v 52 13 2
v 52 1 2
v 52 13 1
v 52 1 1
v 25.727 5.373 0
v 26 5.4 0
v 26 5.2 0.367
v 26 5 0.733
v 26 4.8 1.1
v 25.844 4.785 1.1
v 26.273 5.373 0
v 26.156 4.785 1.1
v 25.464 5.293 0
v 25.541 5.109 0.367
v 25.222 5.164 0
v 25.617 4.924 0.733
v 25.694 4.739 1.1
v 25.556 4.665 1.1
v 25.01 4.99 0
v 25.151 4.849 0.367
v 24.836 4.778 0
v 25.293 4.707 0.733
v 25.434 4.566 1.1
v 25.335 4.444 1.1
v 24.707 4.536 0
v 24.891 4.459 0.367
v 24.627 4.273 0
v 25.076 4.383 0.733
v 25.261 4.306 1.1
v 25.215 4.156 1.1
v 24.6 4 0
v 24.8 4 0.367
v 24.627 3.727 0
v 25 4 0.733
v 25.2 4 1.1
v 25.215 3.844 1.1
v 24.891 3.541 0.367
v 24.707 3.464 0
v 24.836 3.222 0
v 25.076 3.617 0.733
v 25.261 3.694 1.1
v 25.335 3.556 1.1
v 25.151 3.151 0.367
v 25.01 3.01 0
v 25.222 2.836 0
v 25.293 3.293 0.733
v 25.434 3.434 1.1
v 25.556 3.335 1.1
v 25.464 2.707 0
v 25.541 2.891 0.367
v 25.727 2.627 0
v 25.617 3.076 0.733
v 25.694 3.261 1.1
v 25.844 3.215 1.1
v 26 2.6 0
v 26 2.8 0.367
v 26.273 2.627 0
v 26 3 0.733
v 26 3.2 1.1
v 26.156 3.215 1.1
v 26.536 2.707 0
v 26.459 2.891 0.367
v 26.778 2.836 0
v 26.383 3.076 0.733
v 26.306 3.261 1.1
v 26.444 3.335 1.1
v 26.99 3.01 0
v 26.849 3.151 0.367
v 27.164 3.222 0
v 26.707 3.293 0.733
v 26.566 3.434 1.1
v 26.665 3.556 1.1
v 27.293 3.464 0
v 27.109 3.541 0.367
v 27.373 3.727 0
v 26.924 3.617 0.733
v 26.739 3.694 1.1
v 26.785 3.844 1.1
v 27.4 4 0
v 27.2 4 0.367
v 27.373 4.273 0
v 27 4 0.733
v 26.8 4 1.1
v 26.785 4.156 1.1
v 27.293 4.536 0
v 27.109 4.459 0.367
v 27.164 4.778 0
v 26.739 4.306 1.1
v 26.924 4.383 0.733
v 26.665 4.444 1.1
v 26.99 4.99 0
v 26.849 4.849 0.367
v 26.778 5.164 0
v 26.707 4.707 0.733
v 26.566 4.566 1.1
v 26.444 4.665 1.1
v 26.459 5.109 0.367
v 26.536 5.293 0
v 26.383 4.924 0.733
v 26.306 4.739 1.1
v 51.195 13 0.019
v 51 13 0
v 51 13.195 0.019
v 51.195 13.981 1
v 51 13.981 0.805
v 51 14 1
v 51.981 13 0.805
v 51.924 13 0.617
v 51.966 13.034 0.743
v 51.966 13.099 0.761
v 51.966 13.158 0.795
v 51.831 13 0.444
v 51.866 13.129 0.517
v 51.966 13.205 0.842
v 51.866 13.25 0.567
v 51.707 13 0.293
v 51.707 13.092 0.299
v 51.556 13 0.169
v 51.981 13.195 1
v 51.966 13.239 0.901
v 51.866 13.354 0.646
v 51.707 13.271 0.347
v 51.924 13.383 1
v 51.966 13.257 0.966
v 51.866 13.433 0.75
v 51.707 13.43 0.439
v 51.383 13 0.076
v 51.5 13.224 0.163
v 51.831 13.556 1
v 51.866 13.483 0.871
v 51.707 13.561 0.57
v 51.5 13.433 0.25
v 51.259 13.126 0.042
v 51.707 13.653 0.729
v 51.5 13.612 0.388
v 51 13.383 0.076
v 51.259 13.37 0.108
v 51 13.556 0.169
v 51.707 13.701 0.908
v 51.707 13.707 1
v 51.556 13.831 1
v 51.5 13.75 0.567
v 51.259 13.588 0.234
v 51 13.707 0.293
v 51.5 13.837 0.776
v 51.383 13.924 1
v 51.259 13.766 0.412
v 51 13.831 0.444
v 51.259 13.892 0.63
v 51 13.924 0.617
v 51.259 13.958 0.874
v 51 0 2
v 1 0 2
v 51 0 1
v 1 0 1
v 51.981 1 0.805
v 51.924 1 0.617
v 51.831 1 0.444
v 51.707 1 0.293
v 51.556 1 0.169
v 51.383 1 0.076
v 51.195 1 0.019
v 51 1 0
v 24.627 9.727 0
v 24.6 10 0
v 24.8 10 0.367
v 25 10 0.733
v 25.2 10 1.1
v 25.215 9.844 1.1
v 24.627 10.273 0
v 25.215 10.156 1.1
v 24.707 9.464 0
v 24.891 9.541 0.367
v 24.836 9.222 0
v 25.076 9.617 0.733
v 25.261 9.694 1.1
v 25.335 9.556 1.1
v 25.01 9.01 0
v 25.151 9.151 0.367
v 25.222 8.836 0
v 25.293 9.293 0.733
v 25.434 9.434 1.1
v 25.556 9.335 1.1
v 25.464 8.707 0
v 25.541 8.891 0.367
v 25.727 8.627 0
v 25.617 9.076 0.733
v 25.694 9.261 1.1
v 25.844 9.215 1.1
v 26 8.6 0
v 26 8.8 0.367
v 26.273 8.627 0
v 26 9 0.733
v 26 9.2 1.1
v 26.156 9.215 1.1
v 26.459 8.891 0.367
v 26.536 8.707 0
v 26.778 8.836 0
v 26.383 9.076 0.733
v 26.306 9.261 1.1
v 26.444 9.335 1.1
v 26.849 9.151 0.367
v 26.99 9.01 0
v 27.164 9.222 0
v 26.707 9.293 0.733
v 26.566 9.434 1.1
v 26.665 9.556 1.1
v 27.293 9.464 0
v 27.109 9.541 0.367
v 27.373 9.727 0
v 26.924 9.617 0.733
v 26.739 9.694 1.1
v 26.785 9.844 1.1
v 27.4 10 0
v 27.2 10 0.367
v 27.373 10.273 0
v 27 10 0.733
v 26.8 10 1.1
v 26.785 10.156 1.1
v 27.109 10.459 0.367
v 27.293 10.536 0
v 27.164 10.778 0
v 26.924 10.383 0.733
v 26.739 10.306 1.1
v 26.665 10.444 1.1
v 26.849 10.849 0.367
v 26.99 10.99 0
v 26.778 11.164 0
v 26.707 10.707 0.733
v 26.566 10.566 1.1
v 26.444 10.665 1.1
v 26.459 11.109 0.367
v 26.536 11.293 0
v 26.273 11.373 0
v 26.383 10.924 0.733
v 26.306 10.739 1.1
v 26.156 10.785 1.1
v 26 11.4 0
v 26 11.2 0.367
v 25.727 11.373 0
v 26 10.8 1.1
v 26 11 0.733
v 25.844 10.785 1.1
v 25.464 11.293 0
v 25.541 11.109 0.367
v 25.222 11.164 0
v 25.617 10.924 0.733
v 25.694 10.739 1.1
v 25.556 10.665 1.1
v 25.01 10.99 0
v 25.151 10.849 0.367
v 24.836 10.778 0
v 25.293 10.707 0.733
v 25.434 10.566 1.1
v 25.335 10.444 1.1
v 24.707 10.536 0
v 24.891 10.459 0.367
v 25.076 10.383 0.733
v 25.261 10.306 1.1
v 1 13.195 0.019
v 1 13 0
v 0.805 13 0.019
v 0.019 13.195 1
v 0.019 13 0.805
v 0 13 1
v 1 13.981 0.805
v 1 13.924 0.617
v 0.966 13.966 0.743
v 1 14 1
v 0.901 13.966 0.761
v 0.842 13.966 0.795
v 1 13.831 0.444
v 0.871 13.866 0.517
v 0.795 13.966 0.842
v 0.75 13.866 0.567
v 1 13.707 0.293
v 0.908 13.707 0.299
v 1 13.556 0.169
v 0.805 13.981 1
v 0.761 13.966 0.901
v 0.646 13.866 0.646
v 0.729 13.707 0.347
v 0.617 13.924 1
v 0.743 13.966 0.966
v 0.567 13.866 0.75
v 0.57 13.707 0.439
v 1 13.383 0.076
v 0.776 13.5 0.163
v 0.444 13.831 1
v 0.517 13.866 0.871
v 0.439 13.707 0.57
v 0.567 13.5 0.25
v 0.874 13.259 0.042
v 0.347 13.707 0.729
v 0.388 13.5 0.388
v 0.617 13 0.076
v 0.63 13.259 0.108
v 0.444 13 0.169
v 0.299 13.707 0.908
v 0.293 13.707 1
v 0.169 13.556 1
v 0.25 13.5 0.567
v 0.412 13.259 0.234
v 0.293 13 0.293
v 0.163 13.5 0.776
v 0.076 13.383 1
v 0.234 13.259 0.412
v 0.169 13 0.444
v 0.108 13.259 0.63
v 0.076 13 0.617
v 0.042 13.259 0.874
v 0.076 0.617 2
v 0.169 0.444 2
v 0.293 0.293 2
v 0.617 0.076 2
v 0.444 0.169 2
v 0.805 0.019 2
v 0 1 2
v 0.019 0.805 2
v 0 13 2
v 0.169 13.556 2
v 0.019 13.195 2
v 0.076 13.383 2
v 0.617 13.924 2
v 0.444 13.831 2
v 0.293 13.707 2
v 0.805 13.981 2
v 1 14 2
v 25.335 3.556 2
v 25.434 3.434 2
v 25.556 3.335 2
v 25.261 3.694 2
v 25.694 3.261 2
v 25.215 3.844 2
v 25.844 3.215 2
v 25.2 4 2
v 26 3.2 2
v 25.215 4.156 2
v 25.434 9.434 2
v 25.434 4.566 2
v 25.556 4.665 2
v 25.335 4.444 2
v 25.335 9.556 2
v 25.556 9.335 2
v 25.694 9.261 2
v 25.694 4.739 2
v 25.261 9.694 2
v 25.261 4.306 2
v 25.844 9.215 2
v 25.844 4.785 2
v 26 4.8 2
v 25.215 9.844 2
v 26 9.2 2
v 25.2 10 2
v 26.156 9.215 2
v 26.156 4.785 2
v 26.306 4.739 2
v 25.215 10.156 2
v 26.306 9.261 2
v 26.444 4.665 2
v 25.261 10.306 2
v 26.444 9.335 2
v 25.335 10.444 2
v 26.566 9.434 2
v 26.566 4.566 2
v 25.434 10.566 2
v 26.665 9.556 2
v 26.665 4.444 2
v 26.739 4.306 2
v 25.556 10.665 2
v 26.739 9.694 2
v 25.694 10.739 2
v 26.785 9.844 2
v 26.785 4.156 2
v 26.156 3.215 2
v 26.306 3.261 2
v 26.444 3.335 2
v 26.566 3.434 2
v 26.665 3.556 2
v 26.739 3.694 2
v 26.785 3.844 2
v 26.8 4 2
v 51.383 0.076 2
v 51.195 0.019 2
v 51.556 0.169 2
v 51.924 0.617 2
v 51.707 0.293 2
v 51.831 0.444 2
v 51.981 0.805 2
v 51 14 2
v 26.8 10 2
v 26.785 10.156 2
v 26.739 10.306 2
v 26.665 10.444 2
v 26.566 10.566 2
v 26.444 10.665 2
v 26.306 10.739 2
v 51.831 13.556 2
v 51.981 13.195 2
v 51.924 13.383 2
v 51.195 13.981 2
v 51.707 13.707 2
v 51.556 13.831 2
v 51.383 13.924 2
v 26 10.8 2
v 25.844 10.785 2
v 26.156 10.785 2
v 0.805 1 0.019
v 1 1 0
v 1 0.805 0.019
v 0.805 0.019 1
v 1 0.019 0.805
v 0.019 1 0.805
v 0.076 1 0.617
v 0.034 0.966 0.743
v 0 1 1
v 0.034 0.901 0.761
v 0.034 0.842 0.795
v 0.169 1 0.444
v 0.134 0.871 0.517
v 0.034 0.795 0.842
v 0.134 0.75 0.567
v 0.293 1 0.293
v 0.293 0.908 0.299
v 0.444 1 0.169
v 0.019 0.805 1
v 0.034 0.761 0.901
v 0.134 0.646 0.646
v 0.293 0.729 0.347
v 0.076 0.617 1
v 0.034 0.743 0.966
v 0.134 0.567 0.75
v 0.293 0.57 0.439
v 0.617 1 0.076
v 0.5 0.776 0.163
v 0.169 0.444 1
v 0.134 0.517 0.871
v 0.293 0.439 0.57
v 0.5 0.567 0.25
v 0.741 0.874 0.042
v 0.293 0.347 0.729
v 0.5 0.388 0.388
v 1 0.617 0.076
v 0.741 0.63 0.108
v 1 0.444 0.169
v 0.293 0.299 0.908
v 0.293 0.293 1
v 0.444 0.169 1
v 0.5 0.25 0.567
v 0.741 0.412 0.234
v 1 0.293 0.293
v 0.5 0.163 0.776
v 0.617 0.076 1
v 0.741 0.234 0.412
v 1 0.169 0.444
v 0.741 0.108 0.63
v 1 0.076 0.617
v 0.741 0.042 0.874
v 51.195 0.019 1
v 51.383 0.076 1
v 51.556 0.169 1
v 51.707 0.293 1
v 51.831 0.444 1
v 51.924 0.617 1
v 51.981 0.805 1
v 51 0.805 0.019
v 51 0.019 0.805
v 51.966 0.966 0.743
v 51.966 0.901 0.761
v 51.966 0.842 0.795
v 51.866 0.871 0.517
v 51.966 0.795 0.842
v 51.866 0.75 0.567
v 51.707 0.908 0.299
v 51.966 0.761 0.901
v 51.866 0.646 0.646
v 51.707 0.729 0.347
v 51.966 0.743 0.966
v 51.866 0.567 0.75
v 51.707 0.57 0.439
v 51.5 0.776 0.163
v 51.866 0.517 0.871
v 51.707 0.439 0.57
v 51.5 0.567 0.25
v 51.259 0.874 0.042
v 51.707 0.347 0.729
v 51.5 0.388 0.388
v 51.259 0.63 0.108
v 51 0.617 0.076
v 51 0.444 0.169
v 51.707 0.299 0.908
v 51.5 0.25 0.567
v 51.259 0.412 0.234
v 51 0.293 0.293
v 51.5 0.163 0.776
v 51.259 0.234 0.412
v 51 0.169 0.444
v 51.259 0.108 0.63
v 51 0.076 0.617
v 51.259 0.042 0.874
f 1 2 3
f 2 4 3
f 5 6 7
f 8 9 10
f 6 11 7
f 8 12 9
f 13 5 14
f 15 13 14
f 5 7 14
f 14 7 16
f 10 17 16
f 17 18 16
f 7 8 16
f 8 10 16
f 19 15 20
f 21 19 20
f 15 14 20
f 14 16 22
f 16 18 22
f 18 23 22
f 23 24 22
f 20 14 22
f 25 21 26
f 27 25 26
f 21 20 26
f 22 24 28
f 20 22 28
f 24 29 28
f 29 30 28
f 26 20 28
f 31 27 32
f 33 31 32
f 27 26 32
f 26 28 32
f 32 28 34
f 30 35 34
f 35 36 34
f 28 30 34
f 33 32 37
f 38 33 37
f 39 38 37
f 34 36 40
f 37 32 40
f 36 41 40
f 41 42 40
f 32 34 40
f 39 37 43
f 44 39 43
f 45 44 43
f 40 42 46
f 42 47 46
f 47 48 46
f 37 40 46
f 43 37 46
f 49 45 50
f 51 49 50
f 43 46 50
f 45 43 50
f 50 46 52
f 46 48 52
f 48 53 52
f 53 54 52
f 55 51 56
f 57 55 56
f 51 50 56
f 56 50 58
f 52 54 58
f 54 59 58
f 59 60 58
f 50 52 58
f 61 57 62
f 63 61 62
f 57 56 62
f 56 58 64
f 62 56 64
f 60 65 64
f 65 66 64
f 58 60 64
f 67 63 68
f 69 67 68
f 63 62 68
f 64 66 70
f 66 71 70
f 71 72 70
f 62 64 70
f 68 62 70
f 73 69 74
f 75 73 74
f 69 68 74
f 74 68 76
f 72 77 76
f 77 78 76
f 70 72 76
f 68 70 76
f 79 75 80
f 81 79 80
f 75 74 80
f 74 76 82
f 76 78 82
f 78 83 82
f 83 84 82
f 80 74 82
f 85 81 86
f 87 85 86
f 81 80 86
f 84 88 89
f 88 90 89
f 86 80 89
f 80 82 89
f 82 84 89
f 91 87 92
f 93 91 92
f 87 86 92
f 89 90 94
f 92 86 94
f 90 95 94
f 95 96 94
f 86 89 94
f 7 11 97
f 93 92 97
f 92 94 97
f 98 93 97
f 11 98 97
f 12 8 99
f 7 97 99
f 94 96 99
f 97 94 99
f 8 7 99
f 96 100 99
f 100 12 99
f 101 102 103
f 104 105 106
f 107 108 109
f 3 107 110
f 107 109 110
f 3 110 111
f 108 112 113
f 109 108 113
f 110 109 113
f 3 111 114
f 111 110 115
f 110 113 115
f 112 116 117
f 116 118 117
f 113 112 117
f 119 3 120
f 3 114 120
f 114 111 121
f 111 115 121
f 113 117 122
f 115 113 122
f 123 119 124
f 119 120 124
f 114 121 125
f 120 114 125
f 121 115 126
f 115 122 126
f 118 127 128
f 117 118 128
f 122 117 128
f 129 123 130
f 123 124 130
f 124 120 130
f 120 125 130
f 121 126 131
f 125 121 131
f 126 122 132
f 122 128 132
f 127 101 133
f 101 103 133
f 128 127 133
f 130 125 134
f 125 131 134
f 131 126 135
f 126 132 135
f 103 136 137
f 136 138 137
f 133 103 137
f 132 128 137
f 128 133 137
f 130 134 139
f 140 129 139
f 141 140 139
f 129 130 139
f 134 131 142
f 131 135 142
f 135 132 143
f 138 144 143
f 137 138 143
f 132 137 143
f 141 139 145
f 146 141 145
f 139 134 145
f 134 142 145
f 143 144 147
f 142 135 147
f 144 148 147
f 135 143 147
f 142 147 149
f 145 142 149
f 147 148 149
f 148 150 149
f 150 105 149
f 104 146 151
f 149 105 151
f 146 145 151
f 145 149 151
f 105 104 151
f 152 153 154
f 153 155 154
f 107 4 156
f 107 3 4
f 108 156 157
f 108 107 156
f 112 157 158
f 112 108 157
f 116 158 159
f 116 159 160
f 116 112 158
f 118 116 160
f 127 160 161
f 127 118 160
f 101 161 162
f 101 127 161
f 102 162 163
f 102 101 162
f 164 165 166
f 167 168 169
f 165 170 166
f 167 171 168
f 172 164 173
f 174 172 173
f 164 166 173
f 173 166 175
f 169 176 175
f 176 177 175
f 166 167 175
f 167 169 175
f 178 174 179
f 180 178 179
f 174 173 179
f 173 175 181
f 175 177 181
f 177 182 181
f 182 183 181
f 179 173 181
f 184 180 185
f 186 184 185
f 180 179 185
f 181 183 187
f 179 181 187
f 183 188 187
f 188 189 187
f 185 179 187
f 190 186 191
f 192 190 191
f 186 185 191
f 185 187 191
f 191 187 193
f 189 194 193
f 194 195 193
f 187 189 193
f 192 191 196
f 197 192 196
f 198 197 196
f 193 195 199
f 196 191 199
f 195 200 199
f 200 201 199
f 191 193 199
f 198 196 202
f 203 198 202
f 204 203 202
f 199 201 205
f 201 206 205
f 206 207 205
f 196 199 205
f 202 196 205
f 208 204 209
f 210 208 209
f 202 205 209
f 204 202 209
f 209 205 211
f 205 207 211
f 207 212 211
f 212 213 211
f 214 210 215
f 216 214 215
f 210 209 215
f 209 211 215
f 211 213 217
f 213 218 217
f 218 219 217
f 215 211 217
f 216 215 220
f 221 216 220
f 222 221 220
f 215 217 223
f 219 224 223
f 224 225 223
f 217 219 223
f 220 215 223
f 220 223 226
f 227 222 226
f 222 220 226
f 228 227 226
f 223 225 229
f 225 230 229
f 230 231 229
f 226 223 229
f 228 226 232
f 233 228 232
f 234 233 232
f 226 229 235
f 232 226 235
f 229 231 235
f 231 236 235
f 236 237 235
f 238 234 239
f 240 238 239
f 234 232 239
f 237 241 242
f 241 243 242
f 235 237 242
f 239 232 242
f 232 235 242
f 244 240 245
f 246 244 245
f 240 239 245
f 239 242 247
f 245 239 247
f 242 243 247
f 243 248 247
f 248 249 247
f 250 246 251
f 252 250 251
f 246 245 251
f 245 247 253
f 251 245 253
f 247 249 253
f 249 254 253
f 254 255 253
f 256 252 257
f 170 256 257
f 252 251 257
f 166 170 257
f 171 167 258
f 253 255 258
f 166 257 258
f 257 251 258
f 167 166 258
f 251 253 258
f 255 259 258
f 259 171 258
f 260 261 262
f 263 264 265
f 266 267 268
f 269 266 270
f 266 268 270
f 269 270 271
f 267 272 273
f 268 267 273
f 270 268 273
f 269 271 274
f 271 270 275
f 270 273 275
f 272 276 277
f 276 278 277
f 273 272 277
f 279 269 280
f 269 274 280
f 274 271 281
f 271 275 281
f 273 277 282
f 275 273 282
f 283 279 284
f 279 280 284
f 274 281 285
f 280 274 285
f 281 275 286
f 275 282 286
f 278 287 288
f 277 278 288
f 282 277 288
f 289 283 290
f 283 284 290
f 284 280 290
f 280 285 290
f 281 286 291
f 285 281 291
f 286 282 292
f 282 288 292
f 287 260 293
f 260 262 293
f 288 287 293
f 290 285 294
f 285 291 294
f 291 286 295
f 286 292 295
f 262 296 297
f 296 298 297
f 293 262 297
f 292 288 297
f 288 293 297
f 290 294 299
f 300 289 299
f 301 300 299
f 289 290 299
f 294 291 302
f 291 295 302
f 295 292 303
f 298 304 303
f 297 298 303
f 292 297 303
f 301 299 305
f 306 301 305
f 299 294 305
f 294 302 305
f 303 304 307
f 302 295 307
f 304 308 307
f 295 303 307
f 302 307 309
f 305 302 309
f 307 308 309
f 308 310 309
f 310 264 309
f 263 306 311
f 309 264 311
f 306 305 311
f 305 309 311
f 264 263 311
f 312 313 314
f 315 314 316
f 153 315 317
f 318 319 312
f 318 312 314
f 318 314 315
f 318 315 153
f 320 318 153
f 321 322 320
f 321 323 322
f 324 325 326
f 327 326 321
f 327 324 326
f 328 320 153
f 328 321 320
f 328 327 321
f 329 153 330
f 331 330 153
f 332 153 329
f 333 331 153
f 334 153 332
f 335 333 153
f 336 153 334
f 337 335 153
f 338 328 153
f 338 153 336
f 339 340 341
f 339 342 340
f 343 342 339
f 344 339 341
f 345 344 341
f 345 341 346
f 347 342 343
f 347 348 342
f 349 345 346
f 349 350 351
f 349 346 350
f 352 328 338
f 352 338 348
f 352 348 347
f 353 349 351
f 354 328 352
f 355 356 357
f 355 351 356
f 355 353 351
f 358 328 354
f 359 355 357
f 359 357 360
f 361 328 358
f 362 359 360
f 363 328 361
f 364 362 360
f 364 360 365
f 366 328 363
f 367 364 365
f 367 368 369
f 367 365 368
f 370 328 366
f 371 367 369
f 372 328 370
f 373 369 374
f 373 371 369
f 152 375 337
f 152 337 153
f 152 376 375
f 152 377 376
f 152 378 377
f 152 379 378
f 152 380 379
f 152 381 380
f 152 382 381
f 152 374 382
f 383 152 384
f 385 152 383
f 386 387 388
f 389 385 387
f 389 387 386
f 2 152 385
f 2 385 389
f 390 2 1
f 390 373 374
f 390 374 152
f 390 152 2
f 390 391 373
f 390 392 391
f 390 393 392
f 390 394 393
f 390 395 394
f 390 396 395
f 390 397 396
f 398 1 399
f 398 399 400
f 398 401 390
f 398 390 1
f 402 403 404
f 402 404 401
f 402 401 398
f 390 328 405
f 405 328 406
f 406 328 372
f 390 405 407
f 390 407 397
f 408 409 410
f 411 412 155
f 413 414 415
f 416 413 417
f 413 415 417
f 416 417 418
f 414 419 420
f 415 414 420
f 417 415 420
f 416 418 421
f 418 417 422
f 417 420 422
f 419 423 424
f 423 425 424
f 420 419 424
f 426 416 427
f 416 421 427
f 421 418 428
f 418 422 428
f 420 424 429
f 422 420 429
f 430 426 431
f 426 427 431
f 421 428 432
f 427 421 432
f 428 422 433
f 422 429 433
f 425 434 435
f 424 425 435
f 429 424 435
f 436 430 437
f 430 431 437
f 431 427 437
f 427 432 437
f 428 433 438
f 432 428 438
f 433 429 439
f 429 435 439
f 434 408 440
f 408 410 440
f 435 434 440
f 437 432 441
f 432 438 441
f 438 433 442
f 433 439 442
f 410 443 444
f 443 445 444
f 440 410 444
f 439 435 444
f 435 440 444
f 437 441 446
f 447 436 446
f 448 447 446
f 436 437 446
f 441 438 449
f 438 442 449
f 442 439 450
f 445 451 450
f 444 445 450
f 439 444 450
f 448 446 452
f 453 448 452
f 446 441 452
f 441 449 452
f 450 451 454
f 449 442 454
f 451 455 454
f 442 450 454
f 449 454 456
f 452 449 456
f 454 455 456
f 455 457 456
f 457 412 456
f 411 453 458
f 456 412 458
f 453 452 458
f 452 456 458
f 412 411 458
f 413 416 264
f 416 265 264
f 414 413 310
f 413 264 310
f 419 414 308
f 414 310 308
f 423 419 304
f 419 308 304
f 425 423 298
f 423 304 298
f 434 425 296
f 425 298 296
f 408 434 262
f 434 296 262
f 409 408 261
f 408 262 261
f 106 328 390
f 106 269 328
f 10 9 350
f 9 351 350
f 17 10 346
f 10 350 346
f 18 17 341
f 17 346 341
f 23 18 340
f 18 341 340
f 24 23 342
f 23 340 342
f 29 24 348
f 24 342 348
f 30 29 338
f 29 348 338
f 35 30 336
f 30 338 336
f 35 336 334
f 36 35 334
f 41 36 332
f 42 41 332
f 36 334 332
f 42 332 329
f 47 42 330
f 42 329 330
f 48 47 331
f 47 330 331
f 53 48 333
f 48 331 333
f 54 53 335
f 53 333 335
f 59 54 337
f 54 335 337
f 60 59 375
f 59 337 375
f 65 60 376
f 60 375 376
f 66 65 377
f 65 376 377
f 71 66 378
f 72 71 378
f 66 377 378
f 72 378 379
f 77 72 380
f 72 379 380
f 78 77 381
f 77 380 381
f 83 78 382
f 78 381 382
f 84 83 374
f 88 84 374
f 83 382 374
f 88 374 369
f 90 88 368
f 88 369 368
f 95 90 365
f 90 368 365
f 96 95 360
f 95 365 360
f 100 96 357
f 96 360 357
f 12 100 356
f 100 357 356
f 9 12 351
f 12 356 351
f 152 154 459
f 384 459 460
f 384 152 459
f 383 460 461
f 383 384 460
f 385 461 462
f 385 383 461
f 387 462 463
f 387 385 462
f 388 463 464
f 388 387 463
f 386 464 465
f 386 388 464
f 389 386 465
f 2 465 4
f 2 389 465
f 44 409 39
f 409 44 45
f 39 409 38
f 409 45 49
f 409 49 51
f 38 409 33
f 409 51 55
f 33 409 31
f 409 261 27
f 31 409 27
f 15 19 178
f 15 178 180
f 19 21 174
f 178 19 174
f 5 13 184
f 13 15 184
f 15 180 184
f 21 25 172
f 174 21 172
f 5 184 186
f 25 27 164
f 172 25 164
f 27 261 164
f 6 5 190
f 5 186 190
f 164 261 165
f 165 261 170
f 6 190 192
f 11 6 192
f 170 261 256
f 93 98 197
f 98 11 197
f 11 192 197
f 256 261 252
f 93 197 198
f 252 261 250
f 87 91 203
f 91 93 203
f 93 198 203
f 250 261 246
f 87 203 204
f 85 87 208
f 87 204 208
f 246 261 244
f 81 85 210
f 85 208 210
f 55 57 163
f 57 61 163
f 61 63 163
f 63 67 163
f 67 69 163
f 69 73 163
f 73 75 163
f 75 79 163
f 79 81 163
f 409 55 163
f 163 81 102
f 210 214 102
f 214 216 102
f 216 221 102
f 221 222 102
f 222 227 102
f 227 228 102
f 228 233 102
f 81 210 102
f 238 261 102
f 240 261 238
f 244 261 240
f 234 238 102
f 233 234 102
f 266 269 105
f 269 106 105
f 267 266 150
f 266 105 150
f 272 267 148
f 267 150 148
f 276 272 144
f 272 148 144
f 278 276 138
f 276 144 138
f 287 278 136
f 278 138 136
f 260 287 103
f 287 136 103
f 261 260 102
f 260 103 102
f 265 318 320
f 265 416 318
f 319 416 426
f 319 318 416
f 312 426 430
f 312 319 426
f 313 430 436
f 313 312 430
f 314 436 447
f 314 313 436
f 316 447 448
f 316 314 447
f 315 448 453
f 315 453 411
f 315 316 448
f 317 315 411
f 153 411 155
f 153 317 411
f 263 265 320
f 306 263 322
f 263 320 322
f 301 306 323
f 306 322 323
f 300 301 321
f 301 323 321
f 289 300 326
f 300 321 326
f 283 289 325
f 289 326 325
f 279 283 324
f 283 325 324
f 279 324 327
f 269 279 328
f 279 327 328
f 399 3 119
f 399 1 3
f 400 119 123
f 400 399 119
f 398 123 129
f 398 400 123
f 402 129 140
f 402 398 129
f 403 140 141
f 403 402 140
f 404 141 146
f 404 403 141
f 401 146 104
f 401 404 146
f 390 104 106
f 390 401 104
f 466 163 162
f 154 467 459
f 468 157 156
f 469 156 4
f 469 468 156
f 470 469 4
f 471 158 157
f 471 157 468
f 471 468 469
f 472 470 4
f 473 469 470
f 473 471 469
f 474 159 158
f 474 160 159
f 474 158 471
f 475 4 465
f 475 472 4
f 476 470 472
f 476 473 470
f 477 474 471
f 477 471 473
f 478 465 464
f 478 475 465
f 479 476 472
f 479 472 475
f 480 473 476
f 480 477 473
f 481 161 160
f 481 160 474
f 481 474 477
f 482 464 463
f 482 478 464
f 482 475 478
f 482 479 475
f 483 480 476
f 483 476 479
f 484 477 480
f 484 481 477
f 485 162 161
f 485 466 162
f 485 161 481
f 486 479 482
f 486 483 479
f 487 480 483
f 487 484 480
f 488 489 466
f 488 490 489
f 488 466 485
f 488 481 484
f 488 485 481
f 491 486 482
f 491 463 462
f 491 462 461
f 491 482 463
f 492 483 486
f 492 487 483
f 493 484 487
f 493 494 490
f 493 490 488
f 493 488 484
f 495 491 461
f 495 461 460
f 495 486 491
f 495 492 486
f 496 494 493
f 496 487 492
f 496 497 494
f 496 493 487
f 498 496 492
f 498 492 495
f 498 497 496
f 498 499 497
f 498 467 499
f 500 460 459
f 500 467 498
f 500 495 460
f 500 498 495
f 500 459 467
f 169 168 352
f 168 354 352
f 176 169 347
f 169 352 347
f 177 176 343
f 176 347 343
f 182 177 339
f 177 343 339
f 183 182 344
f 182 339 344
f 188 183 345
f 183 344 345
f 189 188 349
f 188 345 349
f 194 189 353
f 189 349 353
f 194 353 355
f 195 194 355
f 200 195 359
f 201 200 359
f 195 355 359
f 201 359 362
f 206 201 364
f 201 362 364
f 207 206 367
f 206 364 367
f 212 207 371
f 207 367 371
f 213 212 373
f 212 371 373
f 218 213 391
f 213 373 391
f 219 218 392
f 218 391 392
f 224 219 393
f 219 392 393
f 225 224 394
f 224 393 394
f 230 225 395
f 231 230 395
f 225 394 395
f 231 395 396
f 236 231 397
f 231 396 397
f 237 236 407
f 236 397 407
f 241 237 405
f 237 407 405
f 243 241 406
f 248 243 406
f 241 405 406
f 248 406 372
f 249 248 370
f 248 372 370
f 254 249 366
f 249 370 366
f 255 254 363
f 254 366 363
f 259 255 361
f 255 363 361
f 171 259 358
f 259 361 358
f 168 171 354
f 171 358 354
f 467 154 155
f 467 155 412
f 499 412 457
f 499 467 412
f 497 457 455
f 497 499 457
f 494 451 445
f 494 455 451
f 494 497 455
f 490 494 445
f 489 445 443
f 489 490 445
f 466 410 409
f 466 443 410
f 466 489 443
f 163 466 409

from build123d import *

# Parameters (mm, degrees)
SKETCH_1_W      = 52
SKETCH_1_H      = 14
EXTRUDE_1_DEPTH = 2
FILLET_2_R      = 1


with BuildPart() as part:
    # 草图1 → 凸台-拉伸1 (new body)
    with BuildSketch(Plane.XY):
        with Locations((26, 7)):
            Rectangle(SKETCH_1_W, SKETCH_1_H)
    extrude(amount=EXTRUDE_1_DEPTH)

    # 圆角2
    fillet_2_edges = [part.edges().sort_by_distance(p)[0] for p in [
        (26, 0, 0),
        (0, 7, 0),
        (26, 14, 0),
        (52, 7, 0),
        (52, 0, 1),
        (0, 0, 1),
        (0, 14, 1),
        (52, 14, 1),
    ]]
    fillet(fillet_2_edges, radius=FILLET_2_R)

    # 草图6 → 切除-旋转4 (revolve, cut)
    with BuildSketch(Plane(origin=(26, 0, 0), x_dir=(0, 0, -1), z_dir=(1, 0, 0)), mode=Mode.PRIVATE) as cut_revolve_4_sk:
        Polygon((0, 10), (0, 11.4), (-1.1, 10.8), (-2, 10.8), (-2, 10), align=None)
    revolve(cut_revolve_4_sk.sketch.rotate(Axis((26, 10, 0), (0, 0, 1)), 90), axis=Axis((26, 10, 0), (0, 0, 1)), mode=Mode.SUBTRACT)

    # 草图5 → 切除-旋转5 (revolve, cut)
    with BuildSketch(Plane(origin=(26, 0, 0), x_dir=(0, 0, -1), z_dir=(1, 0, 0)), mode=Mode.PRIVATE) as cut_revolve_5_sk:
        Polygon((0, 4), (0, 2.6), (-1.1, 3.2), (-2, 3.2), (-2, 4), align=None)
    revolve(cut_revolve_5_sk.sketch.rotate(Axis((26, 4, 0), (0, 0, 1)), 180), axis=Axis((26, 4, 0), (0, 0, 1)), mode=Mode.SUBTRACT)


solid = part.part
